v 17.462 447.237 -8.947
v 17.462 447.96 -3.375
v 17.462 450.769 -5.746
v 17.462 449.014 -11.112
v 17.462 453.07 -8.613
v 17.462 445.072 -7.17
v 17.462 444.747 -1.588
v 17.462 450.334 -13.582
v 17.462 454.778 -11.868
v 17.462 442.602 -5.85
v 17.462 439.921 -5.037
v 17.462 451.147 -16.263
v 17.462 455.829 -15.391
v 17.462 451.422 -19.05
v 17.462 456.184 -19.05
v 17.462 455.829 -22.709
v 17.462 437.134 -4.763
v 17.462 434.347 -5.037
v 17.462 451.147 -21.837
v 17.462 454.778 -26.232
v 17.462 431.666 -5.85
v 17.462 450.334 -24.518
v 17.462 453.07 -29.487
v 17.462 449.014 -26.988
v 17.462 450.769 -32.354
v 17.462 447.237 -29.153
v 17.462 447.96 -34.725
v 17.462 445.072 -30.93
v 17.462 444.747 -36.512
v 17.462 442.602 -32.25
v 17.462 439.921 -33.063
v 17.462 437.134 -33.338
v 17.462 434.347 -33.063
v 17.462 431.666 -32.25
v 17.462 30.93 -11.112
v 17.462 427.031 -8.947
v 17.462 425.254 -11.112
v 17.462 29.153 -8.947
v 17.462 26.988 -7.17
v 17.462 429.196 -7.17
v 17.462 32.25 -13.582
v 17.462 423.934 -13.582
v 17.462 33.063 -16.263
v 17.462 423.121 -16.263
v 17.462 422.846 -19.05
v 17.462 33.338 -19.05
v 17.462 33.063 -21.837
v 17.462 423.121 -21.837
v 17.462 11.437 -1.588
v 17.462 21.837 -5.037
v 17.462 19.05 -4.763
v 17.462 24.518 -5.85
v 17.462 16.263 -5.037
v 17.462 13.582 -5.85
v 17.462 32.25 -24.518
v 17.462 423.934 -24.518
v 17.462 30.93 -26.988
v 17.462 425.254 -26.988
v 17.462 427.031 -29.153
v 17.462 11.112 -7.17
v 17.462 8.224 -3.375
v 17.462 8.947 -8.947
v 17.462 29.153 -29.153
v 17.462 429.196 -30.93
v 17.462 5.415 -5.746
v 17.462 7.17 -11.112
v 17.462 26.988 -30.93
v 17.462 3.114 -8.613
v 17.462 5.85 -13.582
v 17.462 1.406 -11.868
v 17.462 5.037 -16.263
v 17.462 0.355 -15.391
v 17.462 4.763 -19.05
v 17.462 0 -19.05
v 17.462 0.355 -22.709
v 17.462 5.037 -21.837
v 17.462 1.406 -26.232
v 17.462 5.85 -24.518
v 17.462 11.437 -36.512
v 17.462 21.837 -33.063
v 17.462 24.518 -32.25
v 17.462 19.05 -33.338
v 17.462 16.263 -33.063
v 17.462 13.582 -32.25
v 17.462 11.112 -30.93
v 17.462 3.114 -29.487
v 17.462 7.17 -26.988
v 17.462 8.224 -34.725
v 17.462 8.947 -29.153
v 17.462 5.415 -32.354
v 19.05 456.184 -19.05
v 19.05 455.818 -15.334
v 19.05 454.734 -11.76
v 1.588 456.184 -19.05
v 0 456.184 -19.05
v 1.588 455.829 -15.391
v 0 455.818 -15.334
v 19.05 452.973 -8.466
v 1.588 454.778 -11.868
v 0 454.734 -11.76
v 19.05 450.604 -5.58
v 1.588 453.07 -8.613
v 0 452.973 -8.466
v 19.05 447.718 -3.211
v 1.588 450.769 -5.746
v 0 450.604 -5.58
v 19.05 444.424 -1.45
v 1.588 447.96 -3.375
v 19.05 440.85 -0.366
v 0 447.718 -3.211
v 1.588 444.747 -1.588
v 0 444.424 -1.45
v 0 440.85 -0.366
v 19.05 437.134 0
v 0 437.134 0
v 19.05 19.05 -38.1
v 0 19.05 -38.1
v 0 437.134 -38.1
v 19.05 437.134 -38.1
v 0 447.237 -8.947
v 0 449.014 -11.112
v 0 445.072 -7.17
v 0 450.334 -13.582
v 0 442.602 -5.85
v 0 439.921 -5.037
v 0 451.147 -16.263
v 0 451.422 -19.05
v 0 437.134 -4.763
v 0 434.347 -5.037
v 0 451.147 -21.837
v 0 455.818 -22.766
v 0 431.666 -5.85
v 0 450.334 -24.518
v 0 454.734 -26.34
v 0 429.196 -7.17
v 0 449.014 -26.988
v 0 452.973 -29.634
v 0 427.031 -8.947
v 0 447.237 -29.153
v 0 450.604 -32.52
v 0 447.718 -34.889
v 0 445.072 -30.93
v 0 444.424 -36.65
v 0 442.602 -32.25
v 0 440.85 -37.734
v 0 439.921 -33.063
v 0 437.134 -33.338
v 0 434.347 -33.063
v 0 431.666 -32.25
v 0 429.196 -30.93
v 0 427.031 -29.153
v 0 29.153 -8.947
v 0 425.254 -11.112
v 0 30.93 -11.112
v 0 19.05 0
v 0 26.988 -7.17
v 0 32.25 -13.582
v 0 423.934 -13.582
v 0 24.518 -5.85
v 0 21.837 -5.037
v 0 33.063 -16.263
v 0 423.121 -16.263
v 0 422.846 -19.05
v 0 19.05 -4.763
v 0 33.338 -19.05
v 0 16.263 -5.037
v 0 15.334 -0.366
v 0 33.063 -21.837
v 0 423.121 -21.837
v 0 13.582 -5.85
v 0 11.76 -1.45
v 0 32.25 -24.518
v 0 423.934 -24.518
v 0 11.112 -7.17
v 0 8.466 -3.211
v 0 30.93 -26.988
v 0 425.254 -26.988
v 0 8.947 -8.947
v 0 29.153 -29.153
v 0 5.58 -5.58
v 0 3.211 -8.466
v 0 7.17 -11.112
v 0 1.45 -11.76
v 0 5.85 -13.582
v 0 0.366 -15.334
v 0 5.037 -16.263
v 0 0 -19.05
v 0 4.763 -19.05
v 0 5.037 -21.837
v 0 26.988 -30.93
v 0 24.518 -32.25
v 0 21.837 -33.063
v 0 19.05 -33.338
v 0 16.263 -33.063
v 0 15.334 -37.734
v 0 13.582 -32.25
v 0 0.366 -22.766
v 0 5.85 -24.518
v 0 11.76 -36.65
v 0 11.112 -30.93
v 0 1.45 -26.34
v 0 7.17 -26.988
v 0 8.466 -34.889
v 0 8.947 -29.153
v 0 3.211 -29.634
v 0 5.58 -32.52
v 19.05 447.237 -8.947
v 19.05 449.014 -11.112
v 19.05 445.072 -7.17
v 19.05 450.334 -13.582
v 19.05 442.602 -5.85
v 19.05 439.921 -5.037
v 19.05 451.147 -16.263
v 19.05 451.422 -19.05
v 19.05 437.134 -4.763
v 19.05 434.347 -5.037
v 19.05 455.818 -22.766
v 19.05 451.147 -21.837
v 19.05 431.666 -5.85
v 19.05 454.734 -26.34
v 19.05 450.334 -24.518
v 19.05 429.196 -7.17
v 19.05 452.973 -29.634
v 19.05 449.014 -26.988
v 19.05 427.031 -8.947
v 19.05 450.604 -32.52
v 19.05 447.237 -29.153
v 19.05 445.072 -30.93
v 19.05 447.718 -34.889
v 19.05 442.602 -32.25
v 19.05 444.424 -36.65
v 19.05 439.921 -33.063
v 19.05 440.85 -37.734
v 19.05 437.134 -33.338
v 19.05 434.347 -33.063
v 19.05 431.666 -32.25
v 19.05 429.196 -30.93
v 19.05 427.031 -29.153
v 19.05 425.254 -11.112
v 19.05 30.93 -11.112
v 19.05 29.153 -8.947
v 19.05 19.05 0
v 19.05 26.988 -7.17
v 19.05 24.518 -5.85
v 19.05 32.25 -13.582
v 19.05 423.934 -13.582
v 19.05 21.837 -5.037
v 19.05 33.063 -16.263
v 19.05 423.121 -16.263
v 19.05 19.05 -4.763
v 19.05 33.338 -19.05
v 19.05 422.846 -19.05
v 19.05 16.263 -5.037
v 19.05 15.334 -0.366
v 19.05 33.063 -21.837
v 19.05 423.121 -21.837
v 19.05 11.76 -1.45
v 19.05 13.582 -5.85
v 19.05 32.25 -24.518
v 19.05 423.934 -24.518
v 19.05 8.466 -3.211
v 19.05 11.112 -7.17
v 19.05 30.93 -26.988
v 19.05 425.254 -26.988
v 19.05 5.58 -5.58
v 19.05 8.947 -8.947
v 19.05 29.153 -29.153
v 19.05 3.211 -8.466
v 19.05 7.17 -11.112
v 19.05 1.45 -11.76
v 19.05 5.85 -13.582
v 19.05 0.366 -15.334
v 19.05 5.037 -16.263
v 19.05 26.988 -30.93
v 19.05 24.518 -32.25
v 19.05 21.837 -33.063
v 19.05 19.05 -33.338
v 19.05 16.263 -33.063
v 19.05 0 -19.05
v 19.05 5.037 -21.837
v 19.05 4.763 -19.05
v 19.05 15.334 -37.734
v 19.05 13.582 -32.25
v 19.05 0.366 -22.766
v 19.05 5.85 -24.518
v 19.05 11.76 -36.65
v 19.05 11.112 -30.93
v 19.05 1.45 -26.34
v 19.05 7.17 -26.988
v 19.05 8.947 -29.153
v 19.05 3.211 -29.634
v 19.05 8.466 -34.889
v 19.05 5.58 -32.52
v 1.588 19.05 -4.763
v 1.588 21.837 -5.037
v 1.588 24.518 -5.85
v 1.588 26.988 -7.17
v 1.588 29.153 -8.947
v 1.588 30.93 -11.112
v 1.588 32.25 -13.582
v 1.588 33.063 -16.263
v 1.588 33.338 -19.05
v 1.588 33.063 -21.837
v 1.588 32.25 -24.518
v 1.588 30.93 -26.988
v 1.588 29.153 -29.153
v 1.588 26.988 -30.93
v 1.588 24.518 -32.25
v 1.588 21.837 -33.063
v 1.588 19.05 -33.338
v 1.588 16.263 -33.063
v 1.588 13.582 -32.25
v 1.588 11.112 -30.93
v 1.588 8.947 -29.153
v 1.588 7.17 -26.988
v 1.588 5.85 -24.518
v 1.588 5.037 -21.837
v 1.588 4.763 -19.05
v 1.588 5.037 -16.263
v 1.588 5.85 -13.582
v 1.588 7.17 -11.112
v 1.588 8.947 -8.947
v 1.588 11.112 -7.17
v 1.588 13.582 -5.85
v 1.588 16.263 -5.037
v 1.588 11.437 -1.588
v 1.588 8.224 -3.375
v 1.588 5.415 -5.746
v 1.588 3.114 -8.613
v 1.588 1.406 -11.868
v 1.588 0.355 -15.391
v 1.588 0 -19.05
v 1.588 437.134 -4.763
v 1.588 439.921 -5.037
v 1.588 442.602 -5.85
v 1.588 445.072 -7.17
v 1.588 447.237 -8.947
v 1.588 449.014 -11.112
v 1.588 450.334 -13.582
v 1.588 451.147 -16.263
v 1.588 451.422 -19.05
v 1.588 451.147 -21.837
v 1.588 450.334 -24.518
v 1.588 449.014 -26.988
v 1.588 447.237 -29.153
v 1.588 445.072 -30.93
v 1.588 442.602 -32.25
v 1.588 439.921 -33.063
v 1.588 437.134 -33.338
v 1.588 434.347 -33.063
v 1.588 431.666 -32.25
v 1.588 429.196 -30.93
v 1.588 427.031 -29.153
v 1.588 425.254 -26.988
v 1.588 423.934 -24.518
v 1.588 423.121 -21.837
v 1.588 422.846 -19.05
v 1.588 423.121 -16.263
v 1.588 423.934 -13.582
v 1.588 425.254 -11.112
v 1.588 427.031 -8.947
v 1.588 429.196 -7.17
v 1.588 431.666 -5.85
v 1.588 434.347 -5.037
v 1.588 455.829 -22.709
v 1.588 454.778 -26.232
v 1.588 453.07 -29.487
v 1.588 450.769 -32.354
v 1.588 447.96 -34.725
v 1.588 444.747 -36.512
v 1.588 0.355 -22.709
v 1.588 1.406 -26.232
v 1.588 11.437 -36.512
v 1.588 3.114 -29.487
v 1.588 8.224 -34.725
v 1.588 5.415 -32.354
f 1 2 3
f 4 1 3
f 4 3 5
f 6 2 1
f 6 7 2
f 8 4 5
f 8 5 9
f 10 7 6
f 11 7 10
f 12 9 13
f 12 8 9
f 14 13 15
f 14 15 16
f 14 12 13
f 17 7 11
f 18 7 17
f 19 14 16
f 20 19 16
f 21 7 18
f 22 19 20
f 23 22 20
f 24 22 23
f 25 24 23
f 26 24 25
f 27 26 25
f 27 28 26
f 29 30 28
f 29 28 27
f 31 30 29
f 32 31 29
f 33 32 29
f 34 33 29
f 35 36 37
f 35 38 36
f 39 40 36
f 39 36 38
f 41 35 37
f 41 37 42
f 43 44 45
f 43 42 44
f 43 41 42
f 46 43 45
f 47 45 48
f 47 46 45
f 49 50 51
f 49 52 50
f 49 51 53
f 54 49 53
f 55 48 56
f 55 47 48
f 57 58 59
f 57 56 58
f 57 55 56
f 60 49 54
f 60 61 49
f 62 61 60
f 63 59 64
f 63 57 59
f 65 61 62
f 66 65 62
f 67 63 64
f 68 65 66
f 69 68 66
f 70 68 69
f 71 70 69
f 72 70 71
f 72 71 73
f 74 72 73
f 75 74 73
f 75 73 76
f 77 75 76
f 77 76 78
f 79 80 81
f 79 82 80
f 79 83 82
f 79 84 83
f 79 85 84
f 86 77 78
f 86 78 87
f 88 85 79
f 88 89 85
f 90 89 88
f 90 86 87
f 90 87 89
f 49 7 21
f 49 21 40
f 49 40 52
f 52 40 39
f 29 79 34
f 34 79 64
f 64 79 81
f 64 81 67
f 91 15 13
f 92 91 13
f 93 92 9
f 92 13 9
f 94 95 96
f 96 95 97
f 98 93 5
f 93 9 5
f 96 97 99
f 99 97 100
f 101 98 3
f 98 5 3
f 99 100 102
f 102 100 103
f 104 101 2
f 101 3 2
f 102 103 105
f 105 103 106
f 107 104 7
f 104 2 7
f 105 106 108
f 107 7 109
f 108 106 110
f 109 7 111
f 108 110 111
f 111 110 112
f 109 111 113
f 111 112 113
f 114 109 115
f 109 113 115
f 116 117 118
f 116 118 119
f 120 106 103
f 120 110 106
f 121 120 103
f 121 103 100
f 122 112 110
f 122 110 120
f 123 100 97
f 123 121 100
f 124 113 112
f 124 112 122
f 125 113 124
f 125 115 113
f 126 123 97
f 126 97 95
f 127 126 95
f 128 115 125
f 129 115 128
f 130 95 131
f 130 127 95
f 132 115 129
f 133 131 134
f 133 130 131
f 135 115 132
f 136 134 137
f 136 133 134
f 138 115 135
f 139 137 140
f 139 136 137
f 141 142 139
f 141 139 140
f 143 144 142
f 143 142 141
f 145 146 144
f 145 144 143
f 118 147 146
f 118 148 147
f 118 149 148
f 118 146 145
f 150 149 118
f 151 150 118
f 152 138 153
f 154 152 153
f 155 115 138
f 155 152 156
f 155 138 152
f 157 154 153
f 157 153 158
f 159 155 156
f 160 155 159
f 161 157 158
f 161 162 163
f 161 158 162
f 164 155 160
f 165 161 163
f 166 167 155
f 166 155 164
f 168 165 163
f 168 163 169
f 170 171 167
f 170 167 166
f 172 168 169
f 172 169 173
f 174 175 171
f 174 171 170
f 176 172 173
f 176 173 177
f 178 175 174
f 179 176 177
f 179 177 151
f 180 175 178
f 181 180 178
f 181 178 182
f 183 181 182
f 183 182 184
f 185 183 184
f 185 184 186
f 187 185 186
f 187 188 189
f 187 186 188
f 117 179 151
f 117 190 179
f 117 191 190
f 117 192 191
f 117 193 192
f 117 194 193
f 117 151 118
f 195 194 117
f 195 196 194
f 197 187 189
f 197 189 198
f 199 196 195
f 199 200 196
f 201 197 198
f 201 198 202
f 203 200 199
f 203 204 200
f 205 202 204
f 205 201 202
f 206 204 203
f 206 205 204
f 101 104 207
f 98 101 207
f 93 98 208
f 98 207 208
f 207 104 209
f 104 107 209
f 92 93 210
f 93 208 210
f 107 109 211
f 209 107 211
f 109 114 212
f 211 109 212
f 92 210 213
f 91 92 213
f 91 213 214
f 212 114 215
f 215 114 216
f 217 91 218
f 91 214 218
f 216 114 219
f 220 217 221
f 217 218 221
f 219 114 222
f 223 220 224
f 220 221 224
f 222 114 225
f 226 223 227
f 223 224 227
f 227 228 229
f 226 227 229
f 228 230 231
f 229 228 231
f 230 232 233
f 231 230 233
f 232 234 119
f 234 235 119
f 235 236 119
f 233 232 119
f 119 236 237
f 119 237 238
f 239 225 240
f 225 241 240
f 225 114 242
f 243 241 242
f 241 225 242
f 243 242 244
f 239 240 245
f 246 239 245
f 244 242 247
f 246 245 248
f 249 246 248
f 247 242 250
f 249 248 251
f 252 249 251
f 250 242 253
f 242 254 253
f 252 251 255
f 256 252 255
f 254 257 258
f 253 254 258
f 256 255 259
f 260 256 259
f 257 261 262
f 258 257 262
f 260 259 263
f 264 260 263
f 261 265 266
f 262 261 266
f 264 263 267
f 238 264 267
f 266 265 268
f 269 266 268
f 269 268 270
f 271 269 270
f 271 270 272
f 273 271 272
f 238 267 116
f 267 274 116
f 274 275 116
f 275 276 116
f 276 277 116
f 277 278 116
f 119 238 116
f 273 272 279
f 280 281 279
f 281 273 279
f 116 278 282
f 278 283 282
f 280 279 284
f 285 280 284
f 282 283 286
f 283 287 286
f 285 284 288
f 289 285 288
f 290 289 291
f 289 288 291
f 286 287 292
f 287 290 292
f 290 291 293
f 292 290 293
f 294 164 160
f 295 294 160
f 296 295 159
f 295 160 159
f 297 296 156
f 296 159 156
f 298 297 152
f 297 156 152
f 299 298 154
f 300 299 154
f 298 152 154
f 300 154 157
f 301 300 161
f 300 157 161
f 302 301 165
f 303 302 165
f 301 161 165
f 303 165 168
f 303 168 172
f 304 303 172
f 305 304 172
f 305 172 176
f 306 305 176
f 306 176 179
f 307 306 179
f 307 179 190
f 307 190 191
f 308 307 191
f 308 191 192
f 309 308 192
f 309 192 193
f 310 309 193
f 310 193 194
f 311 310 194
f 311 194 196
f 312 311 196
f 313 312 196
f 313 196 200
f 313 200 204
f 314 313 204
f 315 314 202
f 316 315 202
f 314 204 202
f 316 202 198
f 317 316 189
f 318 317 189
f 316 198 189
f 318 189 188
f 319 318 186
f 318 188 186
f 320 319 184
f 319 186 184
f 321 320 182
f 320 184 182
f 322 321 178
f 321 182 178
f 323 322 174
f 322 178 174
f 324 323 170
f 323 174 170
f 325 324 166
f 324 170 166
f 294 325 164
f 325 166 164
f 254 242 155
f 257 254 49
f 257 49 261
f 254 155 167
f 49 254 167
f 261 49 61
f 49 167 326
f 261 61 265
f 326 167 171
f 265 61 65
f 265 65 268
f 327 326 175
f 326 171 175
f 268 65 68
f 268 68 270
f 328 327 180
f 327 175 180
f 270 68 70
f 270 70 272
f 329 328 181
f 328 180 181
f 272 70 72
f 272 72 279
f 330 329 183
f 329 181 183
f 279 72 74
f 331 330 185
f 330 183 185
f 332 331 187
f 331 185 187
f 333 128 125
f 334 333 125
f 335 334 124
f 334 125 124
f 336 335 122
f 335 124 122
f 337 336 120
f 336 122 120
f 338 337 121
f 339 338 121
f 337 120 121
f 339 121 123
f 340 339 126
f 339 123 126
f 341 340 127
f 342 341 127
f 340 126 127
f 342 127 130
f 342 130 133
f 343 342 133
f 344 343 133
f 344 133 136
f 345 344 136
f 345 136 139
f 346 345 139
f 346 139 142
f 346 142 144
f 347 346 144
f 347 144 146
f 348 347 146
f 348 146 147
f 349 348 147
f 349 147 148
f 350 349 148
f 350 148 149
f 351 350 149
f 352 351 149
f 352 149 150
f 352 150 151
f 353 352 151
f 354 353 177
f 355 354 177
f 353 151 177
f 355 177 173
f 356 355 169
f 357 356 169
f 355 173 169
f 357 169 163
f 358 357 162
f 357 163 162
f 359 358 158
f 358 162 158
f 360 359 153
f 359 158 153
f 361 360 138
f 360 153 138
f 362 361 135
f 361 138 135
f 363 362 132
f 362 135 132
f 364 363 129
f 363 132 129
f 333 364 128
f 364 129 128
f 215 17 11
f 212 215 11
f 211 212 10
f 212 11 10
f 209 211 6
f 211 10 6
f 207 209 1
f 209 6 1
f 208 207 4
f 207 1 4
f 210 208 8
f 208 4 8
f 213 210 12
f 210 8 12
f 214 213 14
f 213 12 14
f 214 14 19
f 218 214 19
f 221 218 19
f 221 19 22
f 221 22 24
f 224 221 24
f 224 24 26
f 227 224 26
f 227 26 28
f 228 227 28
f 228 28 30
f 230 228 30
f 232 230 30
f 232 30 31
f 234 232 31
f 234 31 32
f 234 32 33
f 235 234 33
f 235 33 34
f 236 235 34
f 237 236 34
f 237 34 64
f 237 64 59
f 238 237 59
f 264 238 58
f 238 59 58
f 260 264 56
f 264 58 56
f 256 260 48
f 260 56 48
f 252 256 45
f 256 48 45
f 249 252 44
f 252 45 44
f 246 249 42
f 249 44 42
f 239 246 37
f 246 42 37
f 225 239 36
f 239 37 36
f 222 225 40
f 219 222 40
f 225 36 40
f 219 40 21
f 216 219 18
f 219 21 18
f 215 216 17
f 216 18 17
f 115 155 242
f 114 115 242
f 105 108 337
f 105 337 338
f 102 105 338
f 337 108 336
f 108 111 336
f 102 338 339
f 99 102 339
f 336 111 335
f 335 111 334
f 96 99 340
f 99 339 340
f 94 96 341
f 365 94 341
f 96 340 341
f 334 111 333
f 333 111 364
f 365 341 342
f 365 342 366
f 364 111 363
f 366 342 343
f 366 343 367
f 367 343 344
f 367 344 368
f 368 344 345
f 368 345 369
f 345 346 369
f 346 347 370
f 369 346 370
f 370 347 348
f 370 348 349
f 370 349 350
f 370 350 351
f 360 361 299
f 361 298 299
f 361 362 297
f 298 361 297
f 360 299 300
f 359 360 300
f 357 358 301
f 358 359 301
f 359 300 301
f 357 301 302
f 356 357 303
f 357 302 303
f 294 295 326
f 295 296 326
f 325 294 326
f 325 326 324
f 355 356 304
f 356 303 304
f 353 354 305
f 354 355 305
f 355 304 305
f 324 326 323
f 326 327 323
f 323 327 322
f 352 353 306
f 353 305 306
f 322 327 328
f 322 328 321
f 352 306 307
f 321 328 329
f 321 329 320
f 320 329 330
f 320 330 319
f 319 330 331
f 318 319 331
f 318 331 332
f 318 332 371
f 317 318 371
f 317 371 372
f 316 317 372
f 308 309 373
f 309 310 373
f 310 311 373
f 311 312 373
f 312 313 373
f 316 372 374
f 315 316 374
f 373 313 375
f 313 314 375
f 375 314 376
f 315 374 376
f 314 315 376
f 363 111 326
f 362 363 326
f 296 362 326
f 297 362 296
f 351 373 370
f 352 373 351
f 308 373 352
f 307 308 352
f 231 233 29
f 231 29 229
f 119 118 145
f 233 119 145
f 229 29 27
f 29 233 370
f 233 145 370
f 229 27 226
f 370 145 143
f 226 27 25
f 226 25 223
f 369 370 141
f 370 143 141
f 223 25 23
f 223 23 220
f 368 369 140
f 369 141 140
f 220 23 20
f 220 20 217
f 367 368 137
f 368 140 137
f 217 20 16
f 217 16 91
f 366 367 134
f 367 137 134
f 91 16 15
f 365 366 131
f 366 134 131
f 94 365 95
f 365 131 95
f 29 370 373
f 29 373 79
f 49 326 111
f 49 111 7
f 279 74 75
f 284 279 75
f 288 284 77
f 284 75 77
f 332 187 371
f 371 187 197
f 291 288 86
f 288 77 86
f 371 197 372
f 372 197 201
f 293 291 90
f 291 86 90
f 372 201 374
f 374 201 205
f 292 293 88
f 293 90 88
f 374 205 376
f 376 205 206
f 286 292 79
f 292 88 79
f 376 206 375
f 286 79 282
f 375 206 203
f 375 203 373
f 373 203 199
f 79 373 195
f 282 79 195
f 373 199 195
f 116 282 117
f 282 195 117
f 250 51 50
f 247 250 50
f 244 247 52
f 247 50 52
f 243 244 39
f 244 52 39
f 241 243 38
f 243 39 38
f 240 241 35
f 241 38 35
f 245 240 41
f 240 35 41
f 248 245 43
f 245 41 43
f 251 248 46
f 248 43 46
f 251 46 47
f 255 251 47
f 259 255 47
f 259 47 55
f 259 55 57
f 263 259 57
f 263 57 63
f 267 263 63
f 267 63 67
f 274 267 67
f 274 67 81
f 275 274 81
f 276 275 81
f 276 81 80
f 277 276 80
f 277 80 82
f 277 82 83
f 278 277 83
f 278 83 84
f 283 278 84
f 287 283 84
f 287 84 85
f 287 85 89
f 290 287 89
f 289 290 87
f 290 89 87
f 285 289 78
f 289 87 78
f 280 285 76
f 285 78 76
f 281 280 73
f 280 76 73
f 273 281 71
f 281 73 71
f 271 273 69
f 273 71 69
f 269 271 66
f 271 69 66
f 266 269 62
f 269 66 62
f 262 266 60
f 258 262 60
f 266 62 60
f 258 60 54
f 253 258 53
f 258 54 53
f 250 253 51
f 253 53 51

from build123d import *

# Parameters (mm, degrees)
SKETCH2_W           = 19.05
SKETCH2_H           = 38.1
SKETCH2_W_2         = 15.875
SKETCH2_H_2         = 34.925
EXTRUDE_THIN1_DEPTH = 456.184
SKETCH3_R           = 14.2875
CUT_EXTRUDE1_DEPTH  = 20.05


with BuildPart() as part:
    # Sketch2 → Extrude-Thin1 (new body)
    with BuildSketch(Plane(origin=(0, 0, 0), x_dir=(1, 0, 0), z_dir=(0, 1, 0))):
        with Locations((9.525, 19.05)):
            Rectangle(SKETCH2_W, SKETCH2_H)
        with Locations((9.525, 19.05)):
            Rectangle(SKETCH2_W_2, SKETCH2_H_2, mode=Mode.SUBTRACT)
    extrude(amount=EXTRUDE_THIN1_DEPTH)

    # Sketch3 → Cut-Extrude1 (cut, through all)
    with BuildSketch(Plane.ZY):
        with Locations((-19.05, 19.05)):
            Circle(SKETCH3_R)
        with BuildLine():
            ThreePointArc((-19.05, 0), (-32.520384182, 5.579615818), (-38.1, 19.05))
            Line((-38.1, 19.05), (-38.1, 0))
            Line((-38.1, 0), (-19.05, 0))
        make_face()
        with BuildLine():
            ThreePointArc((0, 19.05), (-5.579615818, 5.579615818), (-19.05, 0))
            Line((-19.05, 0), (0, 0))
            Line((0, 0), (0, 19.05))
        make_face()
        with Locations((-19.05, 437.134)):
            Circle(SKETCH3_R)
        with BuildLine():
            Line((-38.1, 456.184), (-38.1, 437.134))
            ThreePointArc((-38.1, 437.134), (-32.520384182, 450.604384182), (-19.05, 456.184))
            Line((-19.05, 456.184), (-38.1, 456.184))
        make_face()
        with BuildLine():
            Line((0, 456.184), (-19.05, 456.184))
            ThreePointArc((-19.05, 456.184), (-5.579615818, 450.604384182), (0, 437.134))
            Line((0, 437.134), (0, 456.184))
        make_face()
    extrude(amount=-CUT_EXTRUDE1_DEPTH, mode=Mode.SUBTRACT)


solid = part.part
